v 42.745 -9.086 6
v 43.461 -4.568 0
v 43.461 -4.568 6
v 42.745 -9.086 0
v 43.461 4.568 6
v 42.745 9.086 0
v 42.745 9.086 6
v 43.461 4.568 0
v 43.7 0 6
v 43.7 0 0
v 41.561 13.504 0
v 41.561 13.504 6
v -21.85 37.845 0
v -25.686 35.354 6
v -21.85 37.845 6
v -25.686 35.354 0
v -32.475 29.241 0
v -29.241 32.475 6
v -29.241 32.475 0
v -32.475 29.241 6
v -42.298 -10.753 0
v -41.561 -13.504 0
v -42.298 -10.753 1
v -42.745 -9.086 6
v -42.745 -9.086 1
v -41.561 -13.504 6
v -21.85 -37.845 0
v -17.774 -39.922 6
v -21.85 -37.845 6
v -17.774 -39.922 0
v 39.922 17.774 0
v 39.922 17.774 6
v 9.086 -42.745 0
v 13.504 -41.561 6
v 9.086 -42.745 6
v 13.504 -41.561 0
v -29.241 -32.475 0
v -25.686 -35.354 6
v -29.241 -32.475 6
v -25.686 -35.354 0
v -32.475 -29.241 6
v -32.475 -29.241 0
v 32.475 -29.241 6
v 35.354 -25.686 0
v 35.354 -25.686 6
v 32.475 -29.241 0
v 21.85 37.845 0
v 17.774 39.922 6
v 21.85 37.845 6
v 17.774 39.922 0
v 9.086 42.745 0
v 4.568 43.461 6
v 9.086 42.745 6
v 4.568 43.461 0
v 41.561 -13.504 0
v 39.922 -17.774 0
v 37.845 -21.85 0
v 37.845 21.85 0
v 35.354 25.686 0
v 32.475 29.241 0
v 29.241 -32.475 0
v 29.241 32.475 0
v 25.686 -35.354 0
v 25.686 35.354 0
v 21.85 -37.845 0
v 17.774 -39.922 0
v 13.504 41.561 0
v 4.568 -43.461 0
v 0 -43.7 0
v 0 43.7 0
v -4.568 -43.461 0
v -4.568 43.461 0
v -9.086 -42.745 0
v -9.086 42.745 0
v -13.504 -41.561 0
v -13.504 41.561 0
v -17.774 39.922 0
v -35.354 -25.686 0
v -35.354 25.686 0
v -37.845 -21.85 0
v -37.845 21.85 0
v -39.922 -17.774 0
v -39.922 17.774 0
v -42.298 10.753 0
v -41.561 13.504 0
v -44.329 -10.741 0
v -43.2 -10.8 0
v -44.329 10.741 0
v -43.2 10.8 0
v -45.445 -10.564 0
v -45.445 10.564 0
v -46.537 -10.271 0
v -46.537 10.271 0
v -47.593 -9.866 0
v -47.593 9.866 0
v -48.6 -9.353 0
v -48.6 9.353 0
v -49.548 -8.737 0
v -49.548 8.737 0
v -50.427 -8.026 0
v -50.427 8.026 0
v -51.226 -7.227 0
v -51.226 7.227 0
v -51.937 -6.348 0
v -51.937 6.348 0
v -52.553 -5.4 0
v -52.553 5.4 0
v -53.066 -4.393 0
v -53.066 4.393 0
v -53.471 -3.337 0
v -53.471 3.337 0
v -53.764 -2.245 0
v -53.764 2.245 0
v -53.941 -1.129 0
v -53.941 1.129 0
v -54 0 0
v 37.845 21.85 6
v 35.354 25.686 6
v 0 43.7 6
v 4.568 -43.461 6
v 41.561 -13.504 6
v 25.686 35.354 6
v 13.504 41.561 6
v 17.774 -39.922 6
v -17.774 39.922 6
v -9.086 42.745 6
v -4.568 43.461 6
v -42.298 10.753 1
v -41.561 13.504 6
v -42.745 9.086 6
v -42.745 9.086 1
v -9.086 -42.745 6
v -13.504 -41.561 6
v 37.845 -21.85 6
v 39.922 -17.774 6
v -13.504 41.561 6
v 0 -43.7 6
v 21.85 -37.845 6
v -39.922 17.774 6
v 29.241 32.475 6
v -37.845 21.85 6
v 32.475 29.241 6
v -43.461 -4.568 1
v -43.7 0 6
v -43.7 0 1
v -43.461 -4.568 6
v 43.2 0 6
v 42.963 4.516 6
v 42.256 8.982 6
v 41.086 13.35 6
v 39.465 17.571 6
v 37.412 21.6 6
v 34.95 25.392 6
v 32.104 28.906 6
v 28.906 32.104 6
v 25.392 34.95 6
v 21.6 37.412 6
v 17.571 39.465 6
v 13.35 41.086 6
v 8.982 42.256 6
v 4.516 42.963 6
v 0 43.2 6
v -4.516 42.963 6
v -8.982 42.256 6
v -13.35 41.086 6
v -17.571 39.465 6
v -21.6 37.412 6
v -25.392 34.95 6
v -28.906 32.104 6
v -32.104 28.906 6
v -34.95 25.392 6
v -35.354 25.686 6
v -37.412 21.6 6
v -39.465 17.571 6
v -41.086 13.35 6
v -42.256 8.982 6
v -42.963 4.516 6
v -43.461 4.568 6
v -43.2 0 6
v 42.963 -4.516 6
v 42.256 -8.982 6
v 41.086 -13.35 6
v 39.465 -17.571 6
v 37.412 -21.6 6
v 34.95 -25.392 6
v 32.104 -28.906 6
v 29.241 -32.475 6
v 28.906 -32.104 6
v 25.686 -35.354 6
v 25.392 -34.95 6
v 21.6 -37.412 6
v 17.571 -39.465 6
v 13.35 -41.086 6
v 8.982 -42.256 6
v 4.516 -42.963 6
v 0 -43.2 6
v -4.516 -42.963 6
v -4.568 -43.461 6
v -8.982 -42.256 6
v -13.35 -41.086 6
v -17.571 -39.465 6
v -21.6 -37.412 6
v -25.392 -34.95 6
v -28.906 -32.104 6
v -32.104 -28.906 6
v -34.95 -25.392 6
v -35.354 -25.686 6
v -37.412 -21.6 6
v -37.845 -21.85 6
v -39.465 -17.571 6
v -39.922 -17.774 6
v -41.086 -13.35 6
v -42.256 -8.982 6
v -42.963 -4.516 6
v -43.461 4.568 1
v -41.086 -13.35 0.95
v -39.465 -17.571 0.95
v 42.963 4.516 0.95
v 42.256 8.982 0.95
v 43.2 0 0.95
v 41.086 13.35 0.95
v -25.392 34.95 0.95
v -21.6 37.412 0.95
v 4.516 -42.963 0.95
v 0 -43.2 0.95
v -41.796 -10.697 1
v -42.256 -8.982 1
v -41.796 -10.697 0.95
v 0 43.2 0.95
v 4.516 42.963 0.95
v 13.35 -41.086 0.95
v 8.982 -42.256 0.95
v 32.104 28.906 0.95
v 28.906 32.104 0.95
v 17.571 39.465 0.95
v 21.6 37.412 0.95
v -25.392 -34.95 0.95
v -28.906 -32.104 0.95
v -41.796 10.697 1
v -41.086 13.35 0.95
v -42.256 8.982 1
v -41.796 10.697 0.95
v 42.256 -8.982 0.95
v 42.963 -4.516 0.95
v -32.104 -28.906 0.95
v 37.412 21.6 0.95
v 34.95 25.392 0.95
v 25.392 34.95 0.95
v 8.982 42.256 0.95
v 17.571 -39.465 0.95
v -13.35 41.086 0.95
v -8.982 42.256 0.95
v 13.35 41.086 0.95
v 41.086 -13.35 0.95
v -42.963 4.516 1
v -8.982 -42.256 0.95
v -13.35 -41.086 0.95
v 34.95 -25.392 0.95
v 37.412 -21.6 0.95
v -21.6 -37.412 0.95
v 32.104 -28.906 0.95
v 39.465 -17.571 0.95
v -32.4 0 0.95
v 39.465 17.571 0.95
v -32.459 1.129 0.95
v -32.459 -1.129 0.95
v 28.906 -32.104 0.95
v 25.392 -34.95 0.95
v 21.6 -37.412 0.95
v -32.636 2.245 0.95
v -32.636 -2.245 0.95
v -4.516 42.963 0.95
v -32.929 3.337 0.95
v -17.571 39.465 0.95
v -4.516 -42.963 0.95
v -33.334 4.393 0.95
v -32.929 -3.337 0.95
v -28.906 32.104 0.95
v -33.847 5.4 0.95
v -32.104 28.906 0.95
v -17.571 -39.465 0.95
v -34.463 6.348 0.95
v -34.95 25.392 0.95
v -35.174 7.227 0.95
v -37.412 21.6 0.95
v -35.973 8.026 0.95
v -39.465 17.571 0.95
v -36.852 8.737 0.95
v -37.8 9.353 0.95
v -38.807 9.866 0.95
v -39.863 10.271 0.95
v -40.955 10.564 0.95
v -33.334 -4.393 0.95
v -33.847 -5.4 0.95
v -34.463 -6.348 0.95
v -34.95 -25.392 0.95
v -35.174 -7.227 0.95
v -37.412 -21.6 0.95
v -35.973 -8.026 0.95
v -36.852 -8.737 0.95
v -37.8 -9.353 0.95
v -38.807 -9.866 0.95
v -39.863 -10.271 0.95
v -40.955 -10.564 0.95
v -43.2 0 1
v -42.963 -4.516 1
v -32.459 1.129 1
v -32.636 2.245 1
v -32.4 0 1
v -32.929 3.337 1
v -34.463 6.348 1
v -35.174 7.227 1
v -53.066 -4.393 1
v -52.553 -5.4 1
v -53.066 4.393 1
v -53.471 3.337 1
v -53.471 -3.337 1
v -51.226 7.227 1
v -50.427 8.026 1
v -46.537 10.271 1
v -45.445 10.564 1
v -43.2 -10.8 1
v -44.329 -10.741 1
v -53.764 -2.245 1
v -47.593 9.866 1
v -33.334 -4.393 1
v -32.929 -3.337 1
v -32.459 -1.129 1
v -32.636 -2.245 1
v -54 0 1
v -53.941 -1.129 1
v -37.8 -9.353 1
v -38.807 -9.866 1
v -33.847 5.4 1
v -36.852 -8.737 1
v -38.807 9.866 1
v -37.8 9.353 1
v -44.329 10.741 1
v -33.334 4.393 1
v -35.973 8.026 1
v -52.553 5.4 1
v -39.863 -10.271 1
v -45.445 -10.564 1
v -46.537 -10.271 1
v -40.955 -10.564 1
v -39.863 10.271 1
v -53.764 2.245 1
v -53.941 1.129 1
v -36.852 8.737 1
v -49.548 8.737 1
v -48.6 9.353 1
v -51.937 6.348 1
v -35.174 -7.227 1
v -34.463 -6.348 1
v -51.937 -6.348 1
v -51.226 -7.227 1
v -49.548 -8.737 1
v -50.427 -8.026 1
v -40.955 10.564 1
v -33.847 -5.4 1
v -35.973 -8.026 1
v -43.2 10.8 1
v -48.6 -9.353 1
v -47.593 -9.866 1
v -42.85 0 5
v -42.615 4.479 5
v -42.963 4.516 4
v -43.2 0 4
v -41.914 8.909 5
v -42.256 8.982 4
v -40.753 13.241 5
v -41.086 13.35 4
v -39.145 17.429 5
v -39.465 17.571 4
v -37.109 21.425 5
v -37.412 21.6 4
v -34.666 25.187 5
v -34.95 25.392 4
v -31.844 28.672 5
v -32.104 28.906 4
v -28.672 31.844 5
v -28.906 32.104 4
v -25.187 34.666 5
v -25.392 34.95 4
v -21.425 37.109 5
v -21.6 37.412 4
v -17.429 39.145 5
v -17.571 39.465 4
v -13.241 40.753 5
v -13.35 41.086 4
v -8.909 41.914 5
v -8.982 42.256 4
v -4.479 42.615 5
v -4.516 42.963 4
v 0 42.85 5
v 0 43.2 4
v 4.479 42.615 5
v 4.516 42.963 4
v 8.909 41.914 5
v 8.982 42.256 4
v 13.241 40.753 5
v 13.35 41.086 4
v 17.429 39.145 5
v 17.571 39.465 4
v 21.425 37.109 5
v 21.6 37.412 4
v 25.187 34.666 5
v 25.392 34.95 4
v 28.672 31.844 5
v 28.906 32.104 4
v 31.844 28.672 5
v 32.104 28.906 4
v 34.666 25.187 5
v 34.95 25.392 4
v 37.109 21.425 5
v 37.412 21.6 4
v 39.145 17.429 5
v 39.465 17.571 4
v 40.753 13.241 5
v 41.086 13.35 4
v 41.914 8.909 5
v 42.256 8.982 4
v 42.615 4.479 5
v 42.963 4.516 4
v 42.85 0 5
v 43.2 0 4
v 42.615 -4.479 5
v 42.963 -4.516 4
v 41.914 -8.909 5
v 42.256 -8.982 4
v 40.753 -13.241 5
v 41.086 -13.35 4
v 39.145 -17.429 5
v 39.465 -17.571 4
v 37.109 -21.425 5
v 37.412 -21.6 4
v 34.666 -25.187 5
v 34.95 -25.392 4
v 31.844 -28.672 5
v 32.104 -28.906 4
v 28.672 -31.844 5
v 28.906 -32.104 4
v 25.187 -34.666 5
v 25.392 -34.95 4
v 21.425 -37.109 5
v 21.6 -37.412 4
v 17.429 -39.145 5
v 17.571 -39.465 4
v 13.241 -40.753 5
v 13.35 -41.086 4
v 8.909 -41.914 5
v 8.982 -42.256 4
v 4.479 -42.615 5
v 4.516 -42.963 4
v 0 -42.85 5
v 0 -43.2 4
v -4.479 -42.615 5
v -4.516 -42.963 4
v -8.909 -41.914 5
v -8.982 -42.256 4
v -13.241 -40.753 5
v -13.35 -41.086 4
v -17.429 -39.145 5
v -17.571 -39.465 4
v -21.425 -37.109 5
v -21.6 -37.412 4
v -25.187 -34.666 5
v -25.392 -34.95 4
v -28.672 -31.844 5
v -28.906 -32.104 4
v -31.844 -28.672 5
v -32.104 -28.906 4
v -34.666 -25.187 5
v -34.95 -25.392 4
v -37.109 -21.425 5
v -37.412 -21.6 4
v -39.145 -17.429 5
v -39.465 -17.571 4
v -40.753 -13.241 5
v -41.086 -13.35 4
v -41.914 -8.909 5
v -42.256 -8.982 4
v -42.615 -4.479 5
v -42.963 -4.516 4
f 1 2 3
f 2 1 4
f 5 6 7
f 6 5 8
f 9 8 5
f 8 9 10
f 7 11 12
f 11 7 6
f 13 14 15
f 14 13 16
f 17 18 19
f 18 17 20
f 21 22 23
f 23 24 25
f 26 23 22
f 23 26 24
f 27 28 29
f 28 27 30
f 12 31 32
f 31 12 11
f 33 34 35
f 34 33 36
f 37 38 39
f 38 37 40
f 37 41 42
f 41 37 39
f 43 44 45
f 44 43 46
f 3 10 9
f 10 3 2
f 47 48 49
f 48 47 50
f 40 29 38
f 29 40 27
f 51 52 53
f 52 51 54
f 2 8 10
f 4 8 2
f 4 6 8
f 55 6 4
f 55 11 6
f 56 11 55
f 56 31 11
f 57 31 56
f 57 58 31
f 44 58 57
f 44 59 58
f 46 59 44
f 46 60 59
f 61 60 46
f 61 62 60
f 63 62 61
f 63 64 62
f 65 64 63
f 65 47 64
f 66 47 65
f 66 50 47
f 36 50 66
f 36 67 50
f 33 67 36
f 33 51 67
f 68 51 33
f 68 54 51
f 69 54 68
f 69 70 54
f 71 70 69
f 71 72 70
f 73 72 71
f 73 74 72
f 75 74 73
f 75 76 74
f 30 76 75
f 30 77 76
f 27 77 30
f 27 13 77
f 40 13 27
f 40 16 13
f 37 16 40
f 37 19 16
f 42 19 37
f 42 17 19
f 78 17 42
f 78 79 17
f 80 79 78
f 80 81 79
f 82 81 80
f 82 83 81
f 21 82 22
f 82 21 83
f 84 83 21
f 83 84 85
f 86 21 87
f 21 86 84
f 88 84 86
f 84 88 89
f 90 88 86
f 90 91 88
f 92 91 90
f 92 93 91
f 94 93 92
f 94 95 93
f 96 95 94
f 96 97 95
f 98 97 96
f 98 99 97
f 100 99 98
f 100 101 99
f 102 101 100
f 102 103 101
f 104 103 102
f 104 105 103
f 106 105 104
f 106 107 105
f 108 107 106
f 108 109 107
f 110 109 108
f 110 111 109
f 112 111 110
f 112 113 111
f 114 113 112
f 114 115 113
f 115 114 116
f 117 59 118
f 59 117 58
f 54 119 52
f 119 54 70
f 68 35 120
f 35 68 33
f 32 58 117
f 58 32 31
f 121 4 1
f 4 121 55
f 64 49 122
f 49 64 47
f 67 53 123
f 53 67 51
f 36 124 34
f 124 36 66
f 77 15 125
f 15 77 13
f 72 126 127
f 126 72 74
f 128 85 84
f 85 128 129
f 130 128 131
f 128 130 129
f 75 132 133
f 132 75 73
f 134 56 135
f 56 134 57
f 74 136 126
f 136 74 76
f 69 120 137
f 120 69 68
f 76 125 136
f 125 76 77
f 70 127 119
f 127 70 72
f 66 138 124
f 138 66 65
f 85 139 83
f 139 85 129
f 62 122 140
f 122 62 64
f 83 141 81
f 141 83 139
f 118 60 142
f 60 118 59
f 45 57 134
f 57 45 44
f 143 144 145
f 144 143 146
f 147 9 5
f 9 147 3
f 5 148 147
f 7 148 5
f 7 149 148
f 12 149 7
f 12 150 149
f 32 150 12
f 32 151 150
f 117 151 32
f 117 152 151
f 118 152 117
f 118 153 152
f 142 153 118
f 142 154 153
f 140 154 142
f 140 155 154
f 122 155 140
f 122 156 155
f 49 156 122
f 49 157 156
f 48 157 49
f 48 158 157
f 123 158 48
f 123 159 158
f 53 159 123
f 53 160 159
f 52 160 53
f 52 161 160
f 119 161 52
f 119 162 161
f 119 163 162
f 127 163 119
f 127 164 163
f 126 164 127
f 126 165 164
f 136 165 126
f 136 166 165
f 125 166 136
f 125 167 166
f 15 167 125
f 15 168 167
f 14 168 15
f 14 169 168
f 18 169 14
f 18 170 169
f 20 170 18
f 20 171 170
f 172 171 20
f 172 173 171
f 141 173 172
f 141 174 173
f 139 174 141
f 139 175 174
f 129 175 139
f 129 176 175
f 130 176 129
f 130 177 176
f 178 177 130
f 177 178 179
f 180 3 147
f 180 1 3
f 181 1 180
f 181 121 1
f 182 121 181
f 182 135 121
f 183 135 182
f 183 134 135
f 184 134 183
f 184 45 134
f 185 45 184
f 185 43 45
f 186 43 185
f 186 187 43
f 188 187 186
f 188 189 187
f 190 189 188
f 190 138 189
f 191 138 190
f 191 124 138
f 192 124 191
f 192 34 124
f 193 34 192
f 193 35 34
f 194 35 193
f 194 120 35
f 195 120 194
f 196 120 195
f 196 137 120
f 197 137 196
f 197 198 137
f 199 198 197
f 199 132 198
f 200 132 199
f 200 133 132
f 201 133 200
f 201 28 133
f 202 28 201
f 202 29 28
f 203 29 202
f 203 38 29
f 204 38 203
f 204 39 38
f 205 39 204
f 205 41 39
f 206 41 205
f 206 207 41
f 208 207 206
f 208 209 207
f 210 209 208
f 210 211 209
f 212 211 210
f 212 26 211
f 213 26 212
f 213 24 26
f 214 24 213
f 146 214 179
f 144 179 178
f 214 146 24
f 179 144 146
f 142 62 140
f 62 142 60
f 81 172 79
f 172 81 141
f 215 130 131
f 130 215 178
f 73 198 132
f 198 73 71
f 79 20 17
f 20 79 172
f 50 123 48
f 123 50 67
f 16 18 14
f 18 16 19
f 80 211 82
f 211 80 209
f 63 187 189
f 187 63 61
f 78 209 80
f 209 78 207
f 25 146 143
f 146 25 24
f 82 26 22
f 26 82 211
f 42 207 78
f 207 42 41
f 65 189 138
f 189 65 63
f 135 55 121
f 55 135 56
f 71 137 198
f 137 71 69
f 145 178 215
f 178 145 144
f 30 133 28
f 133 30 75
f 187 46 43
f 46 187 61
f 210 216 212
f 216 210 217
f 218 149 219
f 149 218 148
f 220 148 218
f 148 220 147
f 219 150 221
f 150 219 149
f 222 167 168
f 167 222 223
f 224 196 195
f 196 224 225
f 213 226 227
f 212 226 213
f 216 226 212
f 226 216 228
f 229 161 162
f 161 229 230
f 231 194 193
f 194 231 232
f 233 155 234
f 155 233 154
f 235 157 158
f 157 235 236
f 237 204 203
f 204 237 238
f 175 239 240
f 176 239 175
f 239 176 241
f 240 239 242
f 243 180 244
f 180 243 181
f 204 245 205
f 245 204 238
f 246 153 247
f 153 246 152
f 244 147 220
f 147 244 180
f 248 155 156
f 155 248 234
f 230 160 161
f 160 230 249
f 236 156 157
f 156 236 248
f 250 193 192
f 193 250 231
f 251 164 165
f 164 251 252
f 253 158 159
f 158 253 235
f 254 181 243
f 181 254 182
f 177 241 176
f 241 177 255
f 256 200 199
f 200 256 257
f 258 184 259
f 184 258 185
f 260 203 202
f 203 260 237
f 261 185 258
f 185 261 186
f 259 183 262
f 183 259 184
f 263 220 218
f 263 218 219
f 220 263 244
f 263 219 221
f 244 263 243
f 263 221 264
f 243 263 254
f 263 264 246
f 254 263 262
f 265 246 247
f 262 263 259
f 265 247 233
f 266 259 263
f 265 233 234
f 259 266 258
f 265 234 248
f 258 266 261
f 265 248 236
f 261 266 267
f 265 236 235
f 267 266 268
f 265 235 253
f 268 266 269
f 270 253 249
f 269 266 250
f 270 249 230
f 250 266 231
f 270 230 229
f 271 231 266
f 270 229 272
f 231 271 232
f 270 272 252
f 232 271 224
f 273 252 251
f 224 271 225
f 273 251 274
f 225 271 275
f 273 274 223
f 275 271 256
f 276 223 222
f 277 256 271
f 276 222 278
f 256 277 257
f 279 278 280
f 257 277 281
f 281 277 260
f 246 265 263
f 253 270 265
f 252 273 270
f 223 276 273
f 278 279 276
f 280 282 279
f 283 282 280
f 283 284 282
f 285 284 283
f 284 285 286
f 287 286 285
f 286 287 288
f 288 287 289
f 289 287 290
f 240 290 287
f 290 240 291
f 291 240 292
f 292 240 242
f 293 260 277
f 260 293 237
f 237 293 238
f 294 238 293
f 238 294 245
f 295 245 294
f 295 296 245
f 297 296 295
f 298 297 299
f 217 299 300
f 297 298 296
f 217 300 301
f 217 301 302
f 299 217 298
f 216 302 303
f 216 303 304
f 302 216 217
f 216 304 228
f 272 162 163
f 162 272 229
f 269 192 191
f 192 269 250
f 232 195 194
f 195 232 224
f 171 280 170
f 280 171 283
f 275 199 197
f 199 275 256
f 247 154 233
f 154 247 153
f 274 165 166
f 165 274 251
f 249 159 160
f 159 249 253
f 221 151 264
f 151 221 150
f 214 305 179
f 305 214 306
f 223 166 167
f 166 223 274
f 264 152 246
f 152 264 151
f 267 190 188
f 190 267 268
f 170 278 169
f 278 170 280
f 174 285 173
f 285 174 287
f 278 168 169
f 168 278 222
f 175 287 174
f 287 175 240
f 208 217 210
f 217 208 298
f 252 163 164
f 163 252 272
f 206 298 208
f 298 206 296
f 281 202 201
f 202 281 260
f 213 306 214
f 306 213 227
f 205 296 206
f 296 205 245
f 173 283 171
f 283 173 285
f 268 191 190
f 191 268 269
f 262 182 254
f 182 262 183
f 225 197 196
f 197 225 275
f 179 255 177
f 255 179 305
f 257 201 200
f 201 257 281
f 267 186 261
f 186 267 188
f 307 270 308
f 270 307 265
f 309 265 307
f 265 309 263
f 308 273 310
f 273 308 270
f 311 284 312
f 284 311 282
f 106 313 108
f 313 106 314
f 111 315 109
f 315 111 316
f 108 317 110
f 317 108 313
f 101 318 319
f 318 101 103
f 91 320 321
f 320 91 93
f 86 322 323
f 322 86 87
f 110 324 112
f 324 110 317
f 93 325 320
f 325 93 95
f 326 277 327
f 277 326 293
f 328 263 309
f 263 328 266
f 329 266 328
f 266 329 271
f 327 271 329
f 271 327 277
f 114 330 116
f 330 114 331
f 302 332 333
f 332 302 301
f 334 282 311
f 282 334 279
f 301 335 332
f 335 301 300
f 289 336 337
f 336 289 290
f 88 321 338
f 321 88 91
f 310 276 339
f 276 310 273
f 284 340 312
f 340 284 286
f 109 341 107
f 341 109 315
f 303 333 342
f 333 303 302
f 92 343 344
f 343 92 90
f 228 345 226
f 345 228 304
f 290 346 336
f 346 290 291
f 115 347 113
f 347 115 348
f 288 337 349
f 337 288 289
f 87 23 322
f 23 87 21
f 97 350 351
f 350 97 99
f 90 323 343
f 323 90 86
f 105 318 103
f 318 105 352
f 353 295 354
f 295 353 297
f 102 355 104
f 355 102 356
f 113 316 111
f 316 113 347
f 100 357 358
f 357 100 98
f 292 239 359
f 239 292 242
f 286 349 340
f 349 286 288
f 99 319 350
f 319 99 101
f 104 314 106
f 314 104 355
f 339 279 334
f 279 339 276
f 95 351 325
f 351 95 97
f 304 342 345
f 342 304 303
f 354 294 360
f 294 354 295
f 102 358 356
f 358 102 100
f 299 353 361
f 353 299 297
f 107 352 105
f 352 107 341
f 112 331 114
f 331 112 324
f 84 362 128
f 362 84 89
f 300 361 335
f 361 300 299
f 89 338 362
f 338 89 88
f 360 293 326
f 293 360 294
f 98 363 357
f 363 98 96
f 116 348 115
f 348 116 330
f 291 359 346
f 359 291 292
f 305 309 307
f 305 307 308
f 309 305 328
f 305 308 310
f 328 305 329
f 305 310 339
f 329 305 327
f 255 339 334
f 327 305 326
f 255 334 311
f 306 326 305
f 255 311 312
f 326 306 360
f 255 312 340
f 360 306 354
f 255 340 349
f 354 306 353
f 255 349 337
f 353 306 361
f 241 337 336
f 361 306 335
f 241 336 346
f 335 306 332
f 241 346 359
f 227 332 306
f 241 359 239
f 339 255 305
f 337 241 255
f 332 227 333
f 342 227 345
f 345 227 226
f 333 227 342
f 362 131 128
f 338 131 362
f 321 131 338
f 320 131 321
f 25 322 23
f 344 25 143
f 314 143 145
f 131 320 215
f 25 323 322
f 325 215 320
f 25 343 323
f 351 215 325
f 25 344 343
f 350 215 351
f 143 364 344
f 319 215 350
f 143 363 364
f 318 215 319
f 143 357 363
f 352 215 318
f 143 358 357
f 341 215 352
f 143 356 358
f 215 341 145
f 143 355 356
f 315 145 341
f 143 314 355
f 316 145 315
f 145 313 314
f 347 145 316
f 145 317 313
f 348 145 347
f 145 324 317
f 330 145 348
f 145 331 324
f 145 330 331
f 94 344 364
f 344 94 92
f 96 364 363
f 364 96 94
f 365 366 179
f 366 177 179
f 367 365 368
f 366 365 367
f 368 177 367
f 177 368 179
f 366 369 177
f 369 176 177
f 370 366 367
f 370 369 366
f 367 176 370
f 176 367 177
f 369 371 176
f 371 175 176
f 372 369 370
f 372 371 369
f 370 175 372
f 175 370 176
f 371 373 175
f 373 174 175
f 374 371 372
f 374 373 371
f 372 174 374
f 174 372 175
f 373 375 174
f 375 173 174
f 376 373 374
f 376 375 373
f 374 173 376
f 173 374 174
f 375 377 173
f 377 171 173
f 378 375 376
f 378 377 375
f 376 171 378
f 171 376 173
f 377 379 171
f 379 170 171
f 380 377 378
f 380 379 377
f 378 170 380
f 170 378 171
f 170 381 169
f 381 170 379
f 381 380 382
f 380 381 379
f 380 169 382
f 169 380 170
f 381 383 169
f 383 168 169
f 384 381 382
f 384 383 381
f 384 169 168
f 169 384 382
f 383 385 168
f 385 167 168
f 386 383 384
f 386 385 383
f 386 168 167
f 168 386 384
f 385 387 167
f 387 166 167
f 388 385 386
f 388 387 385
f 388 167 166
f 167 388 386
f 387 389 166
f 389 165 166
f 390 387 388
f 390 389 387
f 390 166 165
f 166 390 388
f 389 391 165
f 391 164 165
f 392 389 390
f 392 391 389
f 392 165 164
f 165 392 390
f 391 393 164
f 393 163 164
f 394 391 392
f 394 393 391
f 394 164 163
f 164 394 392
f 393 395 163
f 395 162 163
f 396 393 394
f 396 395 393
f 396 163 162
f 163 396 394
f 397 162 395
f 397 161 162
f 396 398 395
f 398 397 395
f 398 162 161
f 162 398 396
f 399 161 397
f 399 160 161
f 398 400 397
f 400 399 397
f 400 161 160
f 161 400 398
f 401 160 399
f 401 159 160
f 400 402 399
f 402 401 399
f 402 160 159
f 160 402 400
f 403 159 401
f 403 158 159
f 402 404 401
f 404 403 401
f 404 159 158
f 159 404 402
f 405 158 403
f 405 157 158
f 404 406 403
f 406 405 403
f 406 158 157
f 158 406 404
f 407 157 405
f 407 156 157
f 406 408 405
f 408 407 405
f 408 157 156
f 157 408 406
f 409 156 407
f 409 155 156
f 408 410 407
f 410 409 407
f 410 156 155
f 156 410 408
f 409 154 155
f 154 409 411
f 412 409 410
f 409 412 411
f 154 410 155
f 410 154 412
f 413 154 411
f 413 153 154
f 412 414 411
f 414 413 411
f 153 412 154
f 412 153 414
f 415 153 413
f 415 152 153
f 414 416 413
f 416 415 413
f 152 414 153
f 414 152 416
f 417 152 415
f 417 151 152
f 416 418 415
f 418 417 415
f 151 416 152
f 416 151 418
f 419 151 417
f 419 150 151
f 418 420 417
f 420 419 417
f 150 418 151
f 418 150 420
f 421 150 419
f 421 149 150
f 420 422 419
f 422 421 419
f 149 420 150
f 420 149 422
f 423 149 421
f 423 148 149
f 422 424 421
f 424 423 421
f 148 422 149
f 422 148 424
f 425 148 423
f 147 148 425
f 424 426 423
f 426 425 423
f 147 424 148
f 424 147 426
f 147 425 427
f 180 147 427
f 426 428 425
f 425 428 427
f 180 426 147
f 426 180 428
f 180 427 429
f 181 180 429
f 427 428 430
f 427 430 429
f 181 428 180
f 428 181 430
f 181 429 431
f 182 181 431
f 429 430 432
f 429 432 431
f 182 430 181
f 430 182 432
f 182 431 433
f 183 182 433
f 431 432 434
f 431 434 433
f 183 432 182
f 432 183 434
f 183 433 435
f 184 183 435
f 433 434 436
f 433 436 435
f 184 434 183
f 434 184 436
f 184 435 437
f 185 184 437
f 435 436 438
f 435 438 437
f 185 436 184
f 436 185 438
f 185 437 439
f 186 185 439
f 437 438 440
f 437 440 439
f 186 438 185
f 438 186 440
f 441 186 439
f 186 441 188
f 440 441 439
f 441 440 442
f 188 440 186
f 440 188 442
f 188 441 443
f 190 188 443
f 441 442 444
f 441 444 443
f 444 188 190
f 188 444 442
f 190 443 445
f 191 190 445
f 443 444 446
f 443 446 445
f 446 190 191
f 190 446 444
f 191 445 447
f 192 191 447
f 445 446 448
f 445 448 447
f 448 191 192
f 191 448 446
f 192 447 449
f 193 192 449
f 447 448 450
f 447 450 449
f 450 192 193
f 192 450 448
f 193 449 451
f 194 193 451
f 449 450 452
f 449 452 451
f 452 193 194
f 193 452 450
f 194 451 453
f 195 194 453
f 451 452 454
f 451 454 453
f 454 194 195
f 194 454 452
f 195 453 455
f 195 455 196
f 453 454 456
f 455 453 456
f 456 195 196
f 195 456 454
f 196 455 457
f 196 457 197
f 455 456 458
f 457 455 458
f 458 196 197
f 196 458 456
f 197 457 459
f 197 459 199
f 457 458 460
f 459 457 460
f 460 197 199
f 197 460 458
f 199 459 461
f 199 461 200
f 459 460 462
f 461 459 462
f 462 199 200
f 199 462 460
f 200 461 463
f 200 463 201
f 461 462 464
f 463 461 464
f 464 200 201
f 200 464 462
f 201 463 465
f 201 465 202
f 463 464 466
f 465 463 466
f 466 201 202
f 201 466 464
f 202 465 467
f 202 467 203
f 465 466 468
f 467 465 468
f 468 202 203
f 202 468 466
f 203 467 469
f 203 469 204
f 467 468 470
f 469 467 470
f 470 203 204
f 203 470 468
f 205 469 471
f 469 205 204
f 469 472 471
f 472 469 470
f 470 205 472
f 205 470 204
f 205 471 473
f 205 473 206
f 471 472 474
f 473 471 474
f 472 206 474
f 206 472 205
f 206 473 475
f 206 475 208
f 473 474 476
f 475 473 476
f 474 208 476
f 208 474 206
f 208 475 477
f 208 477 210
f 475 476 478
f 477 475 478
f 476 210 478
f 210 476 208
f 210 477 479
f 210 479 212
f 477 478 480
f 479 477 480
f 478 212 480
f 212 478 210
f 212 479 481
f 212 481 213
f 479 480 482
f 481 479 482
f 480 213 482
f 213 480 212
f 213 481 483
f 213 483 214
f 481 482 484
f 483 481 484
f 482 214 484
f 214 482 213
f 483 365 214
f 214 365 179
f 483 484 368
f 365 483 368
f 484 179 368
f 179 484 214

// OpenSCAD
canDiameter = 86.4;
lidWallThickness = 1;
lipThickness = 0.35;
lipHeight=2;
handleRatio = 0.25;
lidHeight = 5;
lipZAdjustment = 0;
$fn=60;

union() {
    translate([0,0,(lidWallThickness+lidHeight)/2])
    difference() {
        cylinder (h = lidWallThickness+lidHeight, d = canDiameter+lidWallThickness, center=true);
        translate([0,0,lidWallThickness/2])
        cylinder (h = lidHeight+0.1, d = canDiameter, center=true);
    }

    translate ([-canDiameter/2,0,lidWallThickness/2])
        cylinder (h = lidWallThickness, d = canDiameter*handleRatio, center=true);
    
    translate([0,0,lidWallThickness+lidHeight-2+lipZAdjustment])
    rotate_extrude(angle = 360, convexity = 2)
    polygon( points=[[canDiameter/2,2],[canDiameter/2-lipThickness,2-lipHeight/2],[canDiameter/2,2-lipHeight]] );
}
